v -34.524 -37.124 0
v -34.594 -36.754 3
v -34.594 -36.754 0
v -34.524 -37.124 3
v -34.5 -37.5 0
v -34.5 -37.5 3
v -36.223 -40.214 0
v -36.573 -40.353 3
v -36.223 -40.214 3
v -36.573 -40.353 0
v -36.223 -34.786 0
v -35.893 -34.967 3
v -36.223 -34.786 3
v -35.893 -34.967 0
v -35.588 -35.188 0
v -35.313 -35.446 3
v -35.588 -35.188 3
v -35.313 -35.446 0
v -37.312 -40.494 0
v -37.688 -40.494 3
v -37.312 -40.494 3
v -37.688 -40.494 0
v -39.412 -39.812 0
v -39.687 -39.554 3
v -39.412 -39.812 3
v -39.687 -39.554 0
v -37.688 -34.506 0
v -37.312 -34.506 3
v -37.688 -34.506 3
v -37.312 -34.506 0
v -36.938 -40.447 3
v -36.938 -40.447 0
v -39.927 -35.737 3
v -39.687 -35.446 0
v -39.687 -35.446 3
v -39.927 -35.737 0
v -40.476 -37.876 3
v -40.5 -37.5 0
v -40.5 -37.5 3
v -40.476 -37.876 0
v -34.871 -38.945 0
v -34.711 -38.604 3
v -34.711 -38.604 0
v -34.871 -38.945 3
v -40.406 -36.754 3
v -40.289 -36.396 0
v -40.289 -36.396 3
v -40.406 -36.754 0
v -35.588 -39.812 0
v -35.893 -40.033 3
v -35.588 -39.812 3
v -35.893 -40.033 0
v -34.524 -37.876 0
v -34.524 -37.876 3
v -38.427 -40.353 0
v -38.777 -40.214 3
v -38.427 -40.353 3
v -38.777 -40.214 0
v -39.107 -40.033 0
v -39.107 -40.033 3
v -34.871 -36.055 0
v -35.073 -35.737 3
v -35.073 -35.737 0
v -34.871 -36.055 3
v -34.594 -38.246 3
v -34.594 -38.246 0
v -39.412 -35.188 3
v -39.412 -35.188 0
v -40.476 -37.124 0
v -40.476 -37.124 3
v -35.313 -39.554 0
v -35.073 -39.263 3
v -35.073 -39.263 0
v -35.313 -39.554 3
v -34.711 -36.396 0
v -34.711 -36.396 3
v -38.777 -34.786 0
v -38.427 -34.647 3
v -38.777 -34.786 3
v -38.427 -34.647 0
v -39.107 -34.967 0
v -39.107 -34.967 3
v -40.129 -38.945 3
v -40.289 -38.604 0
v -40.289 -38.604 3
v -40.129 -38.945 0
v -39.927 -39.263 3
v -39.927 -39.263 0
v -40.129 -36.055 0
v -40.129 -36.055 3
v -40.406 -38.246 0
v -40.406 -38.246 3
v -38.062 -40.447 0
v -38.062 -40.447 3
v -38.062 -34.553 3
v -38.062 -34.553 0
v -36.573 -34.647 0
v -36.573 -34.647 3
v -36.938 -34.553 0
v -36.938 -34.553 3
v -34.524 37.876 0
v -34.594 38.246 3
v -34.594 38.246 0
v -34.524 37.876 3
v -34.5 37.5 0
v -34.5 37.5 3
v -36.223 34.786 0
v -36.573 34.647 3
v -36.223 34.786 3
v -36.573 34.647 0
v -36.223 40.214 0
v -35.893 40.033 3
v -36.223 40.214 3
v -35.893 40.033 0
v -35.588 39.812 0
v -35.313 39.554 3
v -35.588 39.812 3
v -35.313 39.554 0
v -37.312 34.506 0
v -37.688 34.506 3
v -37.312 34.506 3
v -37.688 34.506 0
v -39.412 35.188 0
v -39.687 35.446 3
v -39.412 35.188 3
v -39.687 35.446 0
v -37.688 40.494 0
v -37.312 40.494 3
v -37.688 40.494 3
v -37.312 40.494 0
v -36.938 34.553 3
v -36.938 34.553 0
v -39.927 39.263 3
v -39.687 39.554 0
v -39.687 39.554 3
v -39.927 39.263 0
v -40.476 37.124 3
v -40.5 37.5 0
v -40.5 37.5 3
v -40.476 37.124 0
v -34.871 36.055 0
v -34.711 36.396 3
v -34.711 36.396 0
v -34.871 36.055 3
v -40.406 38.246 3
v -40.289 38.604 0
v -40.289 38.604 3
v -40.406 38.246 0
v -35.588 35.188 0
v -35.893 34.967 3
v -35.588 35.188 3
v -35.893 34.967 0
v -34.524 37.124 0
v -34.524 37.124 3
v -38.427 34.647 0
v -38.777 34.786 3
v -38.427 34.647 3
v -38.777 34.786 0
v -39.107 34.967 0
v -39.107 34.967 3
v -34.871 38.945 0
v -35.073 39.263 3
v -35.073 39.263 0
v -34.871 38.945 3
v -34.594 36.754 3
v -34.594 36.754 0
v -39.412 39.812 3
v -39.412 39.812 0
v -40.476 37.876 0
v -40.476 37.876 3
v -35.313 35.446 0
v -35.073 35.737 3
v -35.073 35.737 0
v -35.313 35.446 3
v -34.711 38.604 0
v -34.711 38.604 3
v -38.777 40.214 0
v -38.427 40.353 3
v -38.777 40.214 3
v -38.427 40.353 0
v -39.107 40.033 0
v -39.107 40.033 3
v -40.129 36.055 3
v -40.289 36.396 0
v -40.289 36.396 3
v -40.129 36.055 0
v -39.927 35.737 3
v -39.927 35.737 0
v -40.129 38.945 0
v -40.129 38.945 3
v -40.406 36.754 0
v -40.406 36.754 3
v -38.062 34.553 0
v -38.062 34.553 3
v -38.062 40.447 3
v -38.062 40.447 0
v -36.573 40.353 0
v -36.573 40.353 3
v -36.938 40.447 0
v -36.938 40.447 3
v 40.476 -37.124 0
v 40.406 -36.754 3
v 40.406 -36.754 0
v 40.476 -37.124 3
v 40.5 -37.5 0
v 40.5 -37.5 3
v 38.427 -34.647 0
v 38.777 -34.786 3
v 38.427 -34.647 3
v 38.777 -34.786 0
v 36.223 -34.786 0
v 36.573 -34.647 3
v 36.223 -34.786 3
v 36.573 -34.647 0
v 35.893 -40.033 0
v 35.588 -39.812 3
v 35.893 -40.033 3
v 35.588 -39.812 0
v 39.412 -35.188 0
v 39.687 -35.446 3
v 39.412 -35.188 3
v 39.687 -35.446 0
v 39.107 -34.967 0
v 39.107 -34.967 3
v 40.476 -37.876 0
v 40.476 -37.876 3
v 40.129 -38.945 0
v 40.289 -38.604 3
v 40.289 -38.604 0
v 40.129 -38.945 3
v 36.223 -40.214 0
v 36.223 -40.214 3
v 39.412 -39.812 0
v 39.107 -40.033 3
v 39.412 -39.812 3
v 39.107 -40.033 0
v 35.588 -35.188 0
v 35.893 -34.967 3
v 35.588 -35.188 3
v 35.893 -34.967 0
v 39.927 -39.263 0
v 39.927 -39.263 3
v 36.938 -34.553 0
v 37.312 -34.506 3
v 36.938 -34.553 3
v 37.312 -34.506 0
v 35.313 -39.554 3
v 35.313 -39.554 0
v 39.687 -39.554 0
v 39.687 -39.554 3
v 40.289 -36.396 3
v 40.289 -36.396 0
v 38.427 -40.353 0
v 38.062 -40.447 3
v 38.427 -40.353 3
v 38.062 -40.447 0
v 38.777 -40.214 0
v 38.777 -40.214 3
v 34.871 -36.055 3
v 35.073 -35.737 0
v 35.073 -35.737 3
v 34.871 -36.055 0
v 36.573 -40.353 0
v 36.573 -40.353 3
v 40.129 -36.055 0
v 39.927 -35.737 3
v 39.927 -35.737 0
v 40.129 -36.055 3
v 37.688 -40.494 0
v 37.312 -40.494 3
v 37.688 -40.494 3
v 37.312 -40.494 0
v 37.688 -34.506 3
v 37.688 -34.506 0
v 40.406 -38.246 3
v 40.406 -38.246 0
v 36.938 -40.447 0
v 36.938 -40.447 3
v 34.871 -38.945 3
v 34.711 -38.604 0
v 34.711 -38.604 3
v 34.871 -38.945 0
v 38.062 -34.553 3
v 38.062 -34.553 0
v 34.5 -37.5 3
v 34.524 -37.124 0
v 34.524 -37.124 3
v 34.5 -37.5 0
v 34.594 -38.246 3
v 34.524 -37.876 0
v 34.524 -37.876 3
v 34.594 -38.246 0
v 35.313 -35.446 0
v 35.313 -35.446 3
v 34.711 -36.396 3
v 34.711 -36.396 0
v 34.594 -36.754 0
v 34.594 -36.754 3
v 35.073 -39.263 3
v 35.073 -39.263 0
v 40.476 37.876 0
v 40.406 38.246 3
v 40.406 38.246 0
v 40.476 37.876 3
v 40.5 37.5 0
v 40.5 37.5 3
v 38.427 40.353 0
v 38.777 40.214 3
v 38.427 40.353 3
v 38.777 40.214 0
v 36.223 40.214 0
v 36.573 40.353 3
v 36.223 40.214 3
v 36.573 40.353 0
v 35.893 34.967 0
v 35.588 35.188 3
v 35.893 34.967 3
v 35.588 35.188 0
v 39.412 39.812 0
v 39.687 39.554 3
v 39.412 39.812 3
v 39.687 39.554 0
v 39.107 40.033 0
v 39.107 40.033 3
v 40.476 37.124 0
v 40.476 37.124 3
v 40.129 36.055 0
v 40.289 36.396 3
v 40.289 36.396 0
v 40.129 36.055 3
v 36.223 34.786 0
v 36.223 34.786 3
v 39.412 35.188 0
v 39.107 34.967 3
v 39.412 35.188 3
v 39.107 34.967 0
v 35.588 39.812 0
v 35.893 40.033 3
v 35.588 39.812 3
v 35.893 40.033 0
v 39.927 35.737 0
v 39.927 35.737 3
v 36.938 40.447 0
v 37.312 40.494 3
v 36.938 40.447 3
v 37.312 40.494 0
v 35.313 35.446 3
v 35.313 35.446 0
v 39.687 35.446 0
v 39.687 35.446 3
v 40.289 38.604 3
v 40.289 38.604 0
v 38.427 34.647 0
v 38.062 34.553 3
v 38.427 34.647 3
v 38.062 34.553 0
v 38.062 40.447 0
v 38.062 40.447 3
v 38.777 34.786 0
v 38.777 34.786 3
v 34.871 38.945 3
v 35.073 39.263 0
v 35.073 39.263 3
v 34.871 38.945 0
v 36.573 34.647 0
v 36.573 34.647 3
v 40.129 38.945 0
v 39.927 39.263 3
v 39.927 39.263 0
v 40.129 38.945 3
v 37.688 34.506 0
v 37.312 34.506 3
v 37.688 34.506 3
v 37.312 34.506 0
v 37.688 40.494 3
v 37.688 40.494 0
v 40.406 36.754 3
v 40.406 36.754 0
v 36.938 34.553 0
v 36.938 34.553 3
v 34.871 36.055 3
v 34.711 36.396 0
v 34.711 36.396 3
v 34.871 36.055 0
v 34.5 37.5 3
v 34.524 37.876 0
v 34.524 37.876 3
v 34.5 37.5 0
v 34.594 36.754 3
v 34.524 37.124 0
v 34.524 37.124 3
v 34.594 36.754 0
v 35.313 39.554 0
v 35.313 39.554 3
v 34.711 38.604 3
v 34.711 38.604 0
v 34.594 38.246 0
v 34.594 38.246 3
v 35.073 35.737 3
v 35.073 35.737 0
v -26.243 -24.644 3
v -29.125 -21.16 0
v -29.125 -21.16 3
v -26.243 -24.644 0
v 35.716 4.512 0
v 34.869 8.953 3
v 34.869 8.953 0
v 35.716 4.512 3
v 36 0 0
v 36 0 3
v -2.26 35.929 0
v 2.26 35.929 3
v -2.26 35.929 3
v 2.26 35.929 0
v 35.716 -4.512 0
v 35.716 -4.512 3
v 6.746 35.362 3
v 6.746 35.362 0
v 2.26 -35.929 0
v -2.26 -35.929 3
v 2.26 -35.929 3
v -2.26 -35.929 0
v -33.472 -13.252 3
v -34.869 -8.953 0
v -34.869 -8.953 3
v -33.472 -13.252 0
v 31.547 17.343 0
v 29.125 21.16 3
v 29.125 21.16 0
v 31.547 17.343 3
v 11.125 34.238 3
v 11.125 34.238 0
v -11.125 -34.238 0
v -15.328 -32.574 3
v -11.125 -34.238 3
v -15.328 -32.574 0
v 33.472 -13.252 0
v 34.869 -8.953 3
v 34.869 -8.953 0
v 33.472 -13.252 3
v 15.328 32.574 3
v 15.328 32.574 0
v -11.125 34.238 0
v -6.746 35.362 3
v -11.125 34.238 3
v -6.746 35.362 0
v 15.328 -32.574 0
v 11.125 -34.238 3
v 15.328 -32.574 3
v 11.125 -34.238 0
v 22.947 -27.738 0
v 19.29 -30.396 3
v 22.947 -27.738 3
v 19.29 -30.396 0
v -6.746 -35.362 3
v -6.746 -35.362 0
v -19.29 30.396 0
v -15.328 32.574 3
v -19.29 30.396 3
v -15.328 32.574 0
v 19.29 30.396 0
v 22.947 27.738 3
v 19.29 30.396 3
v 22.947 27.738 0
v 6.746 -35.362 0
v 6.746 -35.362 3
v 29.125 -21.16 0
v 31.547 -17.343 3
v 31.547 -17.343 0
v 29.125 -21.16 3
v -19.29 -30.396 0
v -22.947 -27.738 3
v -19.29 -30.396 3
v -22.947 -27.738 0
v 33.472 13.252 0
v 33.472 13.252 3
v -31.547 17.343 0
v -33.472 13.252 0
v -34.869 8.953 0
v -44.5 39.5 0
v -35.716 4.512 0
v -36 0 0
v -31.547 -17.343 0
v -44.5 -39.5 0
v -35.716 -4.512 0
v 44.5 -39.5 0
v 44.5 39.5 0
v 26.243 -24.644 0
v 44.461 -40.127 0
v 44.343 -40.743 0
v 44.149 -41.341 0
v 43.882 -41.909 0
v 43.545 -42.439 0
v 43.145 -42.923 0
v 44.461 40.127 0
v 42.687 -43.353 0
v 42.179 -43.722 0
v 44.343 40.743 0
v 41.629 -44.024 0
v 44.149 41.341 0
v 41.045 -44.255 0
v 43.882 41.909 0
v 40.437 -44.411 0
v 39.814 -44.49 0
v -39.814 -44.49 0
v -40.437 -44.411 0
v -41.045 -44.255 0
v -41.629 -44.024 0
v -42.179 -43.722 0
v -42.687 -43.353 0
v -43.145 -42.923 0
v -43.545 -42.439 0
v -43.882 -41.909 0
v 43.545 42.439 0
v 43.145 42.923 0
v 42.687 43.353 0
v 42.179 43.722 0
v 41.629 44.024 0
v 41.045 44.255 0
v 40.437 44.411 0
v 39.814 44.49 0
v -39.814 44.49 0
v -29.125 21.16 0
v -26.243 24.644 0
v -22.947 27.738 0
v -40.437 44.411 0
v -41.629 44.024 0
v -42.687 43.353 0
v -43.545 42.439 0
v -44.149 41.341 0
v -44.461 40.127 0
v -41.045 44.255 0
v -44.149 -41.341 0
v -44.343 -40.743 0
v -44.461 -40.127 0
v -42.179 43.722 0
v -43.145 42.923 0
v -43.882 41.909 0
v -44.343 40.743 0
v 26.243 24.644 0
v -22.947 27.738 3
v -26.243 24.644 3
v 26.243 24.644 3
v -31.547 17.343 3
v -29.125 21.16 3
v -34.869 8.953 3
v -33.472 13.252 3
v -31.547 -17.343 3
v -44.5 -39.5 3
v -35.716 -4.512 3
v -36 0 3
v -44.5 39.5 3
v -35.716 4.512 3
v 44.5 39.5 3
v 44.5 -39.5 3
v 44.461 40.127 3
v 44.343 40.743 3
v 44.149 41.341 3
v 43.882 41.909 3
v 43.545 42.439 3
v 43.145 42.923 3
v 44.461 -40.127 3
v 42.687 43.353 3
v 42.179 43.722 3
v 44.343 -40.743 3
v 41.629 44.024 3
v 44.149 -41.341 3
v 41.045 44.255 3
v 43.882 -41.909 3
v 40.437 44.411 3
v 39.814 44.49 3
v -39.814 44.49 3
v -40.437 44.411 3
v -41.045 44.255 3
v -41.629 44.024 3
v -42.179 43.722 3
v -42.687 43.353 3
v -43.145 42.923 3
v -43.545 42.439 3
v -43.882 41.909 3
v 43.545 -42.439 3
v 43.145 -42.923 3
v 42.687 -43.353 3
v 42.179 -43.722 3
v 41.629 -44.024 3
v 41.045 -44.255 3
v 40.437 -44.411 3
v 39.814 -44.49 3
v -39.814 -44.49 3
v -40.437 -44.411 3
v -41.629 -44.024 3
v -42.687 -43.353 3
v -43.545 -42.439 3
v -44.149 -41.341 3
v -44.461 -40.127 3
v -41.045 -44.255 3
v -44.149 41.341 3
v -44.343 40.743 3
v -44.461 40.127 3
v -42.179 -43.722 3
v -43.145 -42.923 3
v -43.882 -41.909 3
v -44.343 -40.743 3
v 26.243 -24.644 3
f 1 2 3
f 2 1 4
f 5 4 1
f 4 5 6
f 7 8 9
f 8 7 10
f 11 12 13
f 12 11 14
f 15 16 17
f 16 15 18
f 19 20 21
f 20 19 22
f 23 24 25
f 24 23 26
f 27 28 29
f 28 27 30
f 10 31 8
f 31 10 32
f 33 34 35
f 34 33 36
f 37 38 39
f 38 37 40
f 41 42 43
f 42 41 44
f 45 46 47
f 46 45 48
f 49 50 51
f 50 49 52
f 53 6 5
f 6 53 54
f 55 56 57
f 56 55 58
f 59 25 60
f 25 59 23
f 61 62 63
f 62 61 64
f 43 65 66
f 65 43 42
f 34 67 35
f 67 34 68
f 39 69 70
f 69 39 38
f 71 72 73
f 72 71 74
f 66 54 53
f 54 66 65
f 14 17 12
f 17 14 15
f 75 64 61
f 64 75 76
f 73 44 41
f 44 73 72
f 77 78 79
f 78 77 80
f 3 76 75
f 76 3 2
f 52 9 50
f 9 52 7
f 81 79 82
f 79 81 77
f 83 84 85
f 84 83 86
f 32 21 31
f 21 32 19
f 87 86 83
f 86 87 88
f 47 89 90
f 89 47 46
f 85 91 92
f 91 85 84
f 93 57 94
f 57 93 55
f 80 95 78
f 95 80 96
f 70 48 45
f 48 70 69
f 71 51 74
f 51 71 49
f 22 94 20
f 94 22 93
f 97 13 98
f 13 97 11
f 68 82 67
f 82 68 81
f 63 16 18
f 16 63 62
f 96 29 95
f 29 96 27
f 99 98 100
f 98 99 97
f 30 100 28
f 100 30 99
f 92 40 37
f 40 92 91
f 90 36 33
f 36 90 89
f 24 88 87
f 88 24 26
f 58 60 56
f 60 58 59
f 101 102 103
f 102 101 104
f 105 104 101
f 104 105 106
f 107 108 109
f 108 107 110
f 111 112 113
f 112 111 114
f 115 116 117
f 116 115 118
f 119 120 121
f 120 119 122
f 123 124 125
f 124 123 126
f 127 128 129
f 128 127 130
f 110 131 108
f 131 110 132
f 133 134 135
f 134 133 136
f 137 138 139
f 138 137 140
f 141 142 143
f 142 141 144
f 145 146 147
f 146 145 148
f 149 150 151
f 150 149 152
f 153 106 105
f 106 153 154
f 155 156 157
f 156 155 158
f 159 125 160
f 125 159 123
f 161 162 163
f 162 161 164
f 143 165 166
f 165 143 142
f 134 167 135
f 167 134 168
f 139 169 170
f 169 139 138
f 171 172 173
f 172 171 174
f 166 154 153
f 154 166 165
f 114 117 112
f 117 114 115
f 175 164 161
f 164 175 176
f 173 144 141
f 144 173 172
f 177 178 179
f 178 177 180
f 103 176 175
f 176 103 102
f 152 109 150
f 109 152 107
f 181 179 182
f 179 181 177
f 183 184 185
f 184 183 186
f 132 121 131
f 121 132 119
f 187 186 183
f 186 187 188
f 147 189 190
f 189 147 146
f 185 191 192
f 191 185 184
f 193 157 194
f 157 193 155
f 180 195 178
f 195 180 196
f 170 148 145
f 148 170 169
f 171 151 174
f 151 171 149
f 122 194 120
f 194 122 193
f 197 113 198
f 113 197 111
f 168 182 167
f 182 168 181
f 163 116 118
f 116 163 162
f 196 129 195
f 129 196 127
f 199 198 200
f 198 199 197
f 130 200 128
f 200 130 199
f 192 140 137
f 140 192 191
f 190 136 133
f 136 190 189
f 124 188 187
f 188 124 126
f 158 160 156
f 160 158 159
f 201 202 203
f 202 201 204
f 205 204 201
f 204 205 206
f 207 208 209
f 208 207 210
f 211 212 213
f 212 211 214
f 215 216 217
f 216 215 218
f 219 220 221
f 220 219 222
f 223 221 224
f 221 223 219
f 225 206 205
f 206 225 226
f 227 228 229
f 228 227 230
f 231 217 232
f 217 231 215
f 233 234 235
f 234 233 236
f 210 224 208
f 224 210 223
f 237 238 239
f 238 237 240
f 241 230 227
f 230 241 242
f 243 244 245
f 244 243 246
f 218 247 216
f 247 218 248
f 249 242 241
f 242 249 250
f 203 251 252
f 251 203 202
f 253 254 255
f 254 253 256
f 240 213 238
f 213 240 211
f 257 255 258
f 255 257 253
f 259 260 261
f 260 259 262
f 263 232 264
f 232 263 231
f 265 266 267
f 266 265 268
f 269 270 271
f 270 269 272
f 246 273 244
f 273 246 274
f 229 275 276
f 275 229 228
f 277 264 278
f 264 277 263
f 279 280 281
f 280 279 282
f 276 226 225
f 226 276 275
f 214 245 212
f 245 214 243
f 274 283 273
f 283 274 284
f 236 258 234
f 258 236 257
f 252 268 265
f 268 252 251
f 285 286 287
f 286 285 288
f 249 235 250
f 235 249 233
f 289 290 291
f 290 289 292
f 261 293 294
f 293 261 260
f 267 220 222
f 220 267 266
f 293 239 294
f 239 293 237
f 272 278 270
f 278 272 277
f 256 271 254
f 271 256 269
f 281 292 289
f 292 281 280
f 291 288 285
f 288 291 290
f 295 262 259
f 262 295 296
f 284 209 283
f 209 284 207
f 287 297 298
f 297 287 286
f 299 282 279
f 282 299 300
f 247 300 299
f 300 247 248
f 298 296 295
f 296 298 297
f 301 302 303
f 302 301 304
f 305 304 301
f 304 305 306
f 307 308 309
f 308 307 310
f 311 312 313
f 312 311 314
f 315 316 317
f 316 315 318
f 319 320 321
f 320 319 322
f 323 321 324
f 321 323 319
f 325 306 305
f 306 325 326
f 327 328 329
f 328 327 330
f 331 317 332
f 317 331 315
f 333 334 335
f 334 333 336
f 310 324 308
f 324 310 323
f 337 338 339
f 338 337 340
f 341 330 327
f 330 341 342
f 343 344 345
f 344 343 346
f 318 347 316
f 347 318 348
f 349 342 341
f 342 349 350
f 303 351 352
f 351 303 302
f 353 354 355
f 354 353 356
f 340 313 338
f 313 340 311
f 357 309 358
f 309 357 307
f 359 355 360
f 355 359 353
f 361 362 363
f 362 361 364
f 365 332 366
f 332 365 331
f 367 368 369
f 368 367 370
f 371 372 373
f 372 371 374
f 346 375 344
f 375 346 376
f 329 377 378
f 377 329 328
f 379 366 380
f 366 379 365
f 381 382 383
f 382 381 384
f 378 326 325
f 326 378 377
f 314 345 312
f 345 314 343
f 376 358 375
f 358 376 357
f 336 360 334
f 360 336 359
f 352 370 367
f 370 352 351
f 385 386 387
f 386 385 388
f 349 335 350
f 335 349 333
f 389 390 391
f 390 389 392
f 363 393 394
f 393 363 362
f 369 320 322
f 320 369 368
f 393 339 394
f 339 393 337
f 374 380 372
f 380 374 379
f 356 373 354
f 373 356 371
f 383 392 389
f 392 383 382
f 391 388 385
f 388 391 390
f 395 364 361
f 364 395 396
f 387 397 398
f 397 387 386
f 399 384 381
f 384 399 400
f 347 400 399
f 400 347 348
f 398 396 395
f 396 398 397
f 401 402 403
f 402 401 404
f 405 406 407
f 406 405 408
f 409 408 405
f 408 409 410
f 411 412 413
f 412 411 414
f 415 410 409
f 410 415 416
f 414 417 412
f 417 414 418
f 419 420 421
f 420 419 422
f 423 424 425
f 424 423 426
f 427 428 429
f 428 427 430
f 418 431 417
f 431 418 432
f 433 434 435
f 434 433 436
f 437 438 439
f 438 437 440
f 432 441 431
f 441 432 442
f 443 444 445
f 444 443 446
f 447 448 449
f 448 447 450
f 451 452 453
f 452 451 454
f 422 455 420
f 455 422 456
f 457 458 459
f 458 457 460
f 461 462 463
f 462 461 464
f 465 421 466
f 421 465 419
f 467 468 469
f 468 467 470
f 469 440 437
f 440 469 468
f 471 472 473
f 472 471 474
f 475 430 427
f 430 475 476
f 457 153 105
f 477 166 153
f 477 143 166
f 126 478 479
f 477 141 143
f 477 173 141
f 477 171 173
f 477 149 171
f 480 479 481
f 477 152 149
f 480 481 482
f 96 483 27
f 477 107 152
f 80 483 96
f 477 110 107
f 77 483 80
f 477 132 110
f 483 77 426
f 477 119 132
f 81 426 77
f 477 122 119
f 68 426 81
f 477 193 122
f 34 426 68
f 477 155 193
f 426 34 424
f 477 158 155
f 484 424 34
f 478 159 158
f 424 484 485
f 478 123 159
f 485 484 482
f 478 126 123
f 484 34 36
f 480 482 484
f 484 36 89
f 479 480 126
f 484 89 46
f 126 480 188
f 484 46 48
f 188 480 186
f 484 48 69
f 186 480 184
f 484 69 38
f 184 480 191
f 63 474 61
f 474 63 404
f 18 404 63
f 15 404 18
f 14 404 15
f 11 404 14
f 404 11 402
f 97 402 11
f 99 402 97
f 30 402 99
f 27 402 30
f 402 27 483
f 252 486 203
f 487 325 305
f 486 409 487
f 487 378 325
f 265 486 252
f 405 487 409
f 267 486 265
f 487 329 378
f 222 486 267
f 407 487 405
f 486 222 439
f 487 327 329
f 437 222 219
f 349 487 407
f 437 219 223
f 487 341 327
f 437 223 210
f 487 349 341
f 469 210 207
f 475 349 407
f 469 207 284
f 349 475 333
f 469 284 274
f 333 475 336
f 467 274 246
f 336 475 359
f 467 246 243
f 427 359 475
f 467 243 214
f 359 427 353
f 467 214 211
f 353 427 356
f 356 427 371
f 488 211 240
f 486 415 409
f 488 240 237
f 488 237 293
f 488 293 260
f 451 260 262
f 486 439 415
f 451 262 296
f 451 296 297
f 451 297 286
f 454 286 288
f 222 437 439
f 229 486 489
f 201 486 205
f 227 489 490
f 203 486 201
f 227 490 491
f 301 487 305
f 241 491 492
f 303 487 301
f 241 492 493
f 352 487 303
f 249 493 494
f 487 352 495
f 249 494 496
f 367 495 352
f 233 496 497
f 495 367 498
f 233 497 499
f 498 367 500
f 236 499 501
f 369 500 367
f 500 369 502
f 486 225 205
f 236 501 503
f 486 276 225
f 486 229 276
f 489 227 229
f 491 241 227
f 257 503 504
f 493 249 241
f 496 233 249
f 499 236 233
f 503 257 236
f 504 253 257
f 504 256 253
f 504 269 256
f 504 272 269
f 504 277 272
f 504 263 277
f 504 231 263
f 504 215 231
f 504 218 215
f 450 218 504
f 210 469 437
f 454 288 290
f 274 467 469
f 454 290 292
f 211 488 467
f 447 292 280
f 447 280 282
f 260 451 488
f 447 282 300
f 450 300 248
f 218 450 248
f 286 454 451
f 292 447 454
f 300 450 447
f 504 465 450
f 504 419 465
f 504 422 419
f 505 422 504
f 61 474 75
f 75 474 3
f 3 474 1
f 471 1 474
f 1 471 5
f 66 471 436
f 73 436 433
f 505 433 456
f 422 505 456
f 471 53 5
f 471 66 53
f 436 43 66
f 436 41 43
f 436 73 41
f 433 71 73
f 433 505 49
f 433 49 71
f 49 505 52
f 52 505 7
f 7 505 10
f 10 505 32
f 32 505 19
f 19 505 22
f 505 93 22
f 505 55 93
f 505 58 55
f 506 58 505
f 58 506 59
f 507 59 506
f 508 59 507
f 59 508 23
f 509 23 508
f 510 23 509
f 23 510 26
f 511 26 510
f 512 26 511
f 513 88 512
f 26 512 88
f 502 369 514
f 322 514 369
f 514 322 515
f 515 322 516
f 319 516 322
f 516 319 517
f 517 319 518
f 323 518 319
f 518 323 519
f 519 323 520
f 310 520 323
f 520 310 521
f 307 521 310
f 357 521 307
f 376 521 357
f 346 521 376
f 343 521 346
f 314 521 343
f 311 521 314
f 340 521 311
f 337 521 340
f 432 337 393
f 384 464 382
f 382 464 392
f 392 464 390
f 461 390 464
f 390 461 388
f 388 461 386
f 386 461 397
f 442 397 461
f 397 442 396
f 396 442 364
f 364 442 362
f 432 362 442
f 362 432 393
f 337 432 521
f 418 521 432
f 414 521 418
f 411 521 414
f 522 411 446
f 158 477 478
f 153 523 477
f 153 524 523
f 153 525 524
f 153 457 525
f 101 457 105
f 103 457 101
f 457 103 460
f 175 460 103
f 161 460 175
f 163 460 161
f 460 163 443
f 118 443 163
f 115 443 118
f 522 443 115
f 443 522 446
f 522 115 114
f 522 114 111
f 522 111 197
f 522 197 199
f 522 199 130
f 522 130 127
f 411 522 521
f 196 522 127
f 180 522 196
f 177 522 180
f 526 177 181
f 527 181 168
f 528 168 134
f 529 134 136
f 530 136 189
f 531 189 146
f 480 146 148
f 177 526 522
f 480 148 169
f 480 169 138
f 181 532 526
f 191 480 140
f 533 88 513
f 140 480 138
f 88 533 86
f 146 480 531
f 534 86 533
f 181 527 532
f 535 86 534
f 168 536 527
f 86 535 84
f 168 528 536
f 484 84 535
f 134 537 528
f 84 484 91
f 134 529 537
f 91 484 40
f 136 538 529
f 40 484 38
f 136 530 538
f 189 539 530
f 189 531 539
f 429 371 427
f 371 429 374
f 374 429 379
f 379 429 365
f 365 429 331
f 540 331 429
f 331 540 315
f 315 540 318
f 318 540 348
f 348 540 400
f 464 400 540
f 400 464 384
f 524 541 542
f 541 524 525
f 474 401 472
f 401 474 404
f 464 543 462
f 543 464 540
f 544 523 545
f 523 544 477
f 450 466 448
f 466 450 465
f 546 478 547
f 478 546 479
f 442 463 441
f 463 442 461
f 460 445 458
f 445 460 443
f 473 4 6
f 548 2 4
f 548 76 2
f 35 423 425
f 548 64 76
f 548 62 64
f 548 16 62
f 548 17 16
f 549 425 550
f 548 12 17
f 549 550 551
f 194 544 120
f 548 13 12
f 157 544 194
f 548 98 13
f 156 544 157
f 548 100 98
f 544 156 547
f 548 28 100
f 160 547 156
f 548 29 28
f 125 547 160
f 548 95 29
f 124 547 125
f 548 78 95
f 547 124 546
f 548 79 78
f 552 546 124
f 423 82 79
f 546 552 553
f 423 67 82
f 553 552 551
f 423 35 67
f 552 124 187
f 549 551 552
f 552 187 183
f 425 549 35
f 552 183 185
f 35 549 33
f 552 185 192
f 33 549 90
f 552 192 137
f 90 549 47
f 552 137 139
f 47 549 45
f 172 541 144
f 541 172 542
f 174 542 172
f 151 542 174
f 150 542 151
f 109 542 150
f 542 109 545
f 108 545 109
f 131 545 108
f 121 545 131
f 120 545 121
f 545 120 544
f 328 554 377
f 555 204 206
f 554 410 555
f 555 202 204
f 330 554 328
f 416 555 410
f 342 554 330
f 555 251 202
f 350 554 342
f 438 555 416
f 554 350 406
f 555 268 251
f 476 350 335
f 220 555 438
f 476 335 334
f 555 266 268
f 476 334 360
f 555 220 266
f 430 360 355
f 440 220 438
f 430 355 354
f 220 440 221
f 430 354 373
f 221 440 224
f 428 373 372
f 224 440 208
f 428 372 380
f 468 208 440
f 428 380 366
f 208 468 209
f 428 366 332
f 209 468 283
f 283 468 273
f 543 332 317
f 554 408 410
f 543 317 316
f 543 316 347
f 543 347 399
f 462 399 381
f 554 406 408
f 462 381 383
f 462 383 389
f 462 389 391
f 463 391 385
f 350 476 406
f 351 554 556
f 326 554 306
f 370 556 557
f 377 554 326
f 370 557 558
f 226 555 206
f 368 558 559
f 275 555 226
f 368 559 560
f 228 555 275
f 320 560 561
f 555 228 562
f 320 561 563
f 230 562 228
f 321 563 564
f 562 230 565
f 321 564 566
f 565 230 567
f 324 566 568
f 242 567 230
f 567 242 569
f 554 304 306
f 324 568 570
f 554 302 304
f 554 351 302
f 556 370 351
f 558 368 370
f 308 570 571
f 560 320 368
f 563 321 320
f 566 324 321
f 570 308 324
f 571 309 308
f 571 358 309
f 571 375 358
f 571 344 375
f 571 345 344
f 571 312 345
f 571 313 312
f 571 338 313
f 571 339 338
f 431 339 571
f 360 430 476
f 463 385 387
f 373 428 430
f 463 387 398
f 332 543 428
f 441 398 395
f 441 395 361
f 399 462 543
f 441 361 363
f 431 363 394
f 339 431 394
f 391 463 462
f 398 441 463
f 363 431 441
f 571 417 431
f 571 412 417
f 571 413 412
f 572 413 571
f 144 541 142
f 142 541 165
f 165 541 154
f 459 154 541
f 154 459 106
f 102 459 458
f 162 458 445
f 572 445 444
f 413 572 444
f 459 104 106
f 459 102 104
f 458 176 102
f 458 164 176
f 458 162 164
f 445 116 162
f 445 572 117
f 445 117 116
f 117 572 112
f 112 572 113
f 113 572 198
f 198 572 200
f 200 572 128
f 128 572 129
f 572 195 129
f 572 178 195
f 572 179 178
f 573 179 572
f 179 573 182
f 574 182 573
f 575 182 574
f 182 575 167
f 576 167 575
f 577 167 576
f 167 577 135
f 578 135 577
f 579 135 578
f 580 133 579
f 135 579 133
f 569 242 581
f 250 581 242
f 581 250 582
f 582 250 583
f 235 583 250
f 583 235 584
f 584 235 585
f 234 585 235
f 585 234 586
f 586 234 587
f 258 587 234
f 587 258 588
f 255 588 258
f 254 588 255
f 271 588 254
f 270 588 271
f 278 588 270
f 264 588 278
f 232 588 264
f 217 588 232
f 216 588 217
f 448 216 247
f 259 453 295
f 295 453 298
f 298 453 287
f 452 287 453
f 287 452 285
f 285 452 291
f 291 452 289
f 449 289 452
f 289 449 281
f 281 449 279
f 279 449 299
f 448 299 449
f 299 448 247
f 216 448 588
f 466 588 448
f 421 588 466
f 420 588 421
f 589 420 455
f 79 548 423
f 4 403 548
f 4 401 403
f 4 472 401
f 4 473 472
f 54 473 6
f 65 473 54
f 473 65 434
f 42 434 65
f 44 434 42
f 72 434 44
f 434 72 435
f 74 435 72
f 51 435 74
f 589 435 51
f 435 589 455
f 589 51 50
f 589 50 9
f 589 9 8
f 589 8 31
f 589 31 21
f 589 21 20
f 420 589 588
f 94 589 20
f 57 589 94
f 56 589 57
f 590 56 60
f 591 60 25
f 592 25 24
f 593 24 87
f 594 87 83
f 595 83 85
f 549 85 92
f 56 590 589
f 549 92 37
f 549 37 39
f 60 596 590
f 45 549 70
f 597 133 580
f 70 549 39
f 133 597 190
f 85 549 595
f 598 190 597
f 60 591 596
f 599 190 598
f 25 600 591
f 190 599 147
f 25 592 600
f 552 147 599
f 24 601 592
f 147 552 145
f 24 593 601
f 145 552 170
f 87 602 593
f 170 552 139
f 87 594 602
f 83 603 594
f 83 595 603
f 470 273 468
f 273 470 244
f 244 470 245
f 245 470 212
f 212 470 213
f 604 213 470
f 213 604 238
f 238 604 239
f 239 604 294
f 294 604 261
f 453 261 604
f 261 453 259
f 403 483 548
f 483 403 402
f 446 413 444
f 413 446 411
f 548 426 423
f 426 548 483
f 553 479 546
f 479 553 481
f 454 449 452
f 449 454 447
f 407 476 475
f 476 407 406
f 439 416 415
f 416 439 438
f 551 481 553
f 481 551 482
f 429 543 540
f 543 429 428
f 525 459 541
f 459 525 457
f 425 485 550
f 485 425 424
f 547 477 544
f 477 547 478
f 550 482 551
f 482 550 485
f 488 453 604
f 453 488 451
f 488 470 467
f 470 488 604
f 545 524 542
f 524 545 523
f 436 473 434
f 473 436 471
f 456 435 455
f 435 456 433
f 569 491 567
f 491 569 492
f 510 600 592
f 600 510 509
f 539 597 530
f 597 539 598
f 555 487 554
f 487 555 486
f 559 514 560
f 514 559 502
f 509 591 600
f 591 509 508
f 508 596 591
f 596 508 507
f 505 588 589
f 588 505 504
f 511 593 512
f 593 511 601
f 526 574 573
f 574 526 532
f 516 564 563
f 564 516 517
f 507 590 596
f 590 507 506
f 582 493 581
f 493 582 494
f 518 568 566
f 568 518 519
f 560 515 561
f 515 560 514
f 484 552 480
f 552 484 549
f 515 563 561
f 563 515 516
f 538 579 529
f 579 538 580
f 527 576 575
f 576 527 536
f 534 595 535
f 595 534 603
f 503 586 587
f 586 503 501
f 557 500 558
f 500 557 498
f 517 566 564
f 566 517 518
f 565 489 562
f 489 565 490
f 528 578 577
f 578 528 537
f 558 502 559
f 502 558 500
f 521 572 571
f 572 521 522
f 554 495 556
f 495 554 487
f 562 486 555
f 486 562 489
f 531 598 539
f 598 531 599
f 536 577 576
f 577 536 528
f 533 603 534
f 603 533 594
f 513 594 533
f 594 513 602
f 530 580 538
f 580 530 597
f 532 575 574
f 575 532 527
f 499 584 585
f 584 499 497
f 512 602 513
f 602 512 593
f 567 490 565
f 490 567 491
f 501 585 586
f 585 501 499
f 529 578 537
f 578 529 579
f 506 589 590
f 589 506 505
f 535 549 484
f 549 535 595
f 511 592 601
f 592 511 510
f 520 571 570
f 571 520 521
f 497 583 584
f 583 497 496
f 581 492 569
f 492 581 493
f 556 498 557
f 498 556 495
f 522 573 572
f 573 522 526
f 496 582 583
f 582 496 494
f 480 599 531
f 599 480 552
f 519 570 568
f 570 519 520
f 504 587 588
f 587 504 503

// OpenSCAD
$fn = 50;


difference() {
	union() {
		hull() {
			translate(v = [-39.5000000000, 39.5000000000, 0]) {
				cylinder(h = 3, r = 5);
			}
			translate(v = [39.5000000000, 39.5000000000, 0]) {
				cylinder(h = 3, r = 5);
			}
			translate(v = [-39.5000000000, -39.5000000000, 0]) {
				cylinder(h = 3, r = 5);
			}
			translate(v = [39.5000000000, -39.5000000000, 0]) {
				cylinder(h = 3, r = 5);
			}
		}
	}
	union() {
		#translate(v = [-37.5000000000, -37.5000000000, -100.0000000000]) {
			cylinder(h = 200, r = 3.0000000000);
		}
		#translate(v = [-37.5000000000, 37.5000000000, -100.0000000000]) {
			cylinder(h = 200, r = 3.0000000000);
		}
		#translate(v = [37.5000000000, -37.5000000000, -100.0000000000]) {
			cylinder(h = 200, r = 3.0000000000);
		}
		#translate(v = [37.5000000000, 37.5000000000, -100.0000000000]) {
			cylinder(h = 200, r = 3.0000000000);
		}
		#cylinder(h = 3, r = 36.0000000000);
	}
}
